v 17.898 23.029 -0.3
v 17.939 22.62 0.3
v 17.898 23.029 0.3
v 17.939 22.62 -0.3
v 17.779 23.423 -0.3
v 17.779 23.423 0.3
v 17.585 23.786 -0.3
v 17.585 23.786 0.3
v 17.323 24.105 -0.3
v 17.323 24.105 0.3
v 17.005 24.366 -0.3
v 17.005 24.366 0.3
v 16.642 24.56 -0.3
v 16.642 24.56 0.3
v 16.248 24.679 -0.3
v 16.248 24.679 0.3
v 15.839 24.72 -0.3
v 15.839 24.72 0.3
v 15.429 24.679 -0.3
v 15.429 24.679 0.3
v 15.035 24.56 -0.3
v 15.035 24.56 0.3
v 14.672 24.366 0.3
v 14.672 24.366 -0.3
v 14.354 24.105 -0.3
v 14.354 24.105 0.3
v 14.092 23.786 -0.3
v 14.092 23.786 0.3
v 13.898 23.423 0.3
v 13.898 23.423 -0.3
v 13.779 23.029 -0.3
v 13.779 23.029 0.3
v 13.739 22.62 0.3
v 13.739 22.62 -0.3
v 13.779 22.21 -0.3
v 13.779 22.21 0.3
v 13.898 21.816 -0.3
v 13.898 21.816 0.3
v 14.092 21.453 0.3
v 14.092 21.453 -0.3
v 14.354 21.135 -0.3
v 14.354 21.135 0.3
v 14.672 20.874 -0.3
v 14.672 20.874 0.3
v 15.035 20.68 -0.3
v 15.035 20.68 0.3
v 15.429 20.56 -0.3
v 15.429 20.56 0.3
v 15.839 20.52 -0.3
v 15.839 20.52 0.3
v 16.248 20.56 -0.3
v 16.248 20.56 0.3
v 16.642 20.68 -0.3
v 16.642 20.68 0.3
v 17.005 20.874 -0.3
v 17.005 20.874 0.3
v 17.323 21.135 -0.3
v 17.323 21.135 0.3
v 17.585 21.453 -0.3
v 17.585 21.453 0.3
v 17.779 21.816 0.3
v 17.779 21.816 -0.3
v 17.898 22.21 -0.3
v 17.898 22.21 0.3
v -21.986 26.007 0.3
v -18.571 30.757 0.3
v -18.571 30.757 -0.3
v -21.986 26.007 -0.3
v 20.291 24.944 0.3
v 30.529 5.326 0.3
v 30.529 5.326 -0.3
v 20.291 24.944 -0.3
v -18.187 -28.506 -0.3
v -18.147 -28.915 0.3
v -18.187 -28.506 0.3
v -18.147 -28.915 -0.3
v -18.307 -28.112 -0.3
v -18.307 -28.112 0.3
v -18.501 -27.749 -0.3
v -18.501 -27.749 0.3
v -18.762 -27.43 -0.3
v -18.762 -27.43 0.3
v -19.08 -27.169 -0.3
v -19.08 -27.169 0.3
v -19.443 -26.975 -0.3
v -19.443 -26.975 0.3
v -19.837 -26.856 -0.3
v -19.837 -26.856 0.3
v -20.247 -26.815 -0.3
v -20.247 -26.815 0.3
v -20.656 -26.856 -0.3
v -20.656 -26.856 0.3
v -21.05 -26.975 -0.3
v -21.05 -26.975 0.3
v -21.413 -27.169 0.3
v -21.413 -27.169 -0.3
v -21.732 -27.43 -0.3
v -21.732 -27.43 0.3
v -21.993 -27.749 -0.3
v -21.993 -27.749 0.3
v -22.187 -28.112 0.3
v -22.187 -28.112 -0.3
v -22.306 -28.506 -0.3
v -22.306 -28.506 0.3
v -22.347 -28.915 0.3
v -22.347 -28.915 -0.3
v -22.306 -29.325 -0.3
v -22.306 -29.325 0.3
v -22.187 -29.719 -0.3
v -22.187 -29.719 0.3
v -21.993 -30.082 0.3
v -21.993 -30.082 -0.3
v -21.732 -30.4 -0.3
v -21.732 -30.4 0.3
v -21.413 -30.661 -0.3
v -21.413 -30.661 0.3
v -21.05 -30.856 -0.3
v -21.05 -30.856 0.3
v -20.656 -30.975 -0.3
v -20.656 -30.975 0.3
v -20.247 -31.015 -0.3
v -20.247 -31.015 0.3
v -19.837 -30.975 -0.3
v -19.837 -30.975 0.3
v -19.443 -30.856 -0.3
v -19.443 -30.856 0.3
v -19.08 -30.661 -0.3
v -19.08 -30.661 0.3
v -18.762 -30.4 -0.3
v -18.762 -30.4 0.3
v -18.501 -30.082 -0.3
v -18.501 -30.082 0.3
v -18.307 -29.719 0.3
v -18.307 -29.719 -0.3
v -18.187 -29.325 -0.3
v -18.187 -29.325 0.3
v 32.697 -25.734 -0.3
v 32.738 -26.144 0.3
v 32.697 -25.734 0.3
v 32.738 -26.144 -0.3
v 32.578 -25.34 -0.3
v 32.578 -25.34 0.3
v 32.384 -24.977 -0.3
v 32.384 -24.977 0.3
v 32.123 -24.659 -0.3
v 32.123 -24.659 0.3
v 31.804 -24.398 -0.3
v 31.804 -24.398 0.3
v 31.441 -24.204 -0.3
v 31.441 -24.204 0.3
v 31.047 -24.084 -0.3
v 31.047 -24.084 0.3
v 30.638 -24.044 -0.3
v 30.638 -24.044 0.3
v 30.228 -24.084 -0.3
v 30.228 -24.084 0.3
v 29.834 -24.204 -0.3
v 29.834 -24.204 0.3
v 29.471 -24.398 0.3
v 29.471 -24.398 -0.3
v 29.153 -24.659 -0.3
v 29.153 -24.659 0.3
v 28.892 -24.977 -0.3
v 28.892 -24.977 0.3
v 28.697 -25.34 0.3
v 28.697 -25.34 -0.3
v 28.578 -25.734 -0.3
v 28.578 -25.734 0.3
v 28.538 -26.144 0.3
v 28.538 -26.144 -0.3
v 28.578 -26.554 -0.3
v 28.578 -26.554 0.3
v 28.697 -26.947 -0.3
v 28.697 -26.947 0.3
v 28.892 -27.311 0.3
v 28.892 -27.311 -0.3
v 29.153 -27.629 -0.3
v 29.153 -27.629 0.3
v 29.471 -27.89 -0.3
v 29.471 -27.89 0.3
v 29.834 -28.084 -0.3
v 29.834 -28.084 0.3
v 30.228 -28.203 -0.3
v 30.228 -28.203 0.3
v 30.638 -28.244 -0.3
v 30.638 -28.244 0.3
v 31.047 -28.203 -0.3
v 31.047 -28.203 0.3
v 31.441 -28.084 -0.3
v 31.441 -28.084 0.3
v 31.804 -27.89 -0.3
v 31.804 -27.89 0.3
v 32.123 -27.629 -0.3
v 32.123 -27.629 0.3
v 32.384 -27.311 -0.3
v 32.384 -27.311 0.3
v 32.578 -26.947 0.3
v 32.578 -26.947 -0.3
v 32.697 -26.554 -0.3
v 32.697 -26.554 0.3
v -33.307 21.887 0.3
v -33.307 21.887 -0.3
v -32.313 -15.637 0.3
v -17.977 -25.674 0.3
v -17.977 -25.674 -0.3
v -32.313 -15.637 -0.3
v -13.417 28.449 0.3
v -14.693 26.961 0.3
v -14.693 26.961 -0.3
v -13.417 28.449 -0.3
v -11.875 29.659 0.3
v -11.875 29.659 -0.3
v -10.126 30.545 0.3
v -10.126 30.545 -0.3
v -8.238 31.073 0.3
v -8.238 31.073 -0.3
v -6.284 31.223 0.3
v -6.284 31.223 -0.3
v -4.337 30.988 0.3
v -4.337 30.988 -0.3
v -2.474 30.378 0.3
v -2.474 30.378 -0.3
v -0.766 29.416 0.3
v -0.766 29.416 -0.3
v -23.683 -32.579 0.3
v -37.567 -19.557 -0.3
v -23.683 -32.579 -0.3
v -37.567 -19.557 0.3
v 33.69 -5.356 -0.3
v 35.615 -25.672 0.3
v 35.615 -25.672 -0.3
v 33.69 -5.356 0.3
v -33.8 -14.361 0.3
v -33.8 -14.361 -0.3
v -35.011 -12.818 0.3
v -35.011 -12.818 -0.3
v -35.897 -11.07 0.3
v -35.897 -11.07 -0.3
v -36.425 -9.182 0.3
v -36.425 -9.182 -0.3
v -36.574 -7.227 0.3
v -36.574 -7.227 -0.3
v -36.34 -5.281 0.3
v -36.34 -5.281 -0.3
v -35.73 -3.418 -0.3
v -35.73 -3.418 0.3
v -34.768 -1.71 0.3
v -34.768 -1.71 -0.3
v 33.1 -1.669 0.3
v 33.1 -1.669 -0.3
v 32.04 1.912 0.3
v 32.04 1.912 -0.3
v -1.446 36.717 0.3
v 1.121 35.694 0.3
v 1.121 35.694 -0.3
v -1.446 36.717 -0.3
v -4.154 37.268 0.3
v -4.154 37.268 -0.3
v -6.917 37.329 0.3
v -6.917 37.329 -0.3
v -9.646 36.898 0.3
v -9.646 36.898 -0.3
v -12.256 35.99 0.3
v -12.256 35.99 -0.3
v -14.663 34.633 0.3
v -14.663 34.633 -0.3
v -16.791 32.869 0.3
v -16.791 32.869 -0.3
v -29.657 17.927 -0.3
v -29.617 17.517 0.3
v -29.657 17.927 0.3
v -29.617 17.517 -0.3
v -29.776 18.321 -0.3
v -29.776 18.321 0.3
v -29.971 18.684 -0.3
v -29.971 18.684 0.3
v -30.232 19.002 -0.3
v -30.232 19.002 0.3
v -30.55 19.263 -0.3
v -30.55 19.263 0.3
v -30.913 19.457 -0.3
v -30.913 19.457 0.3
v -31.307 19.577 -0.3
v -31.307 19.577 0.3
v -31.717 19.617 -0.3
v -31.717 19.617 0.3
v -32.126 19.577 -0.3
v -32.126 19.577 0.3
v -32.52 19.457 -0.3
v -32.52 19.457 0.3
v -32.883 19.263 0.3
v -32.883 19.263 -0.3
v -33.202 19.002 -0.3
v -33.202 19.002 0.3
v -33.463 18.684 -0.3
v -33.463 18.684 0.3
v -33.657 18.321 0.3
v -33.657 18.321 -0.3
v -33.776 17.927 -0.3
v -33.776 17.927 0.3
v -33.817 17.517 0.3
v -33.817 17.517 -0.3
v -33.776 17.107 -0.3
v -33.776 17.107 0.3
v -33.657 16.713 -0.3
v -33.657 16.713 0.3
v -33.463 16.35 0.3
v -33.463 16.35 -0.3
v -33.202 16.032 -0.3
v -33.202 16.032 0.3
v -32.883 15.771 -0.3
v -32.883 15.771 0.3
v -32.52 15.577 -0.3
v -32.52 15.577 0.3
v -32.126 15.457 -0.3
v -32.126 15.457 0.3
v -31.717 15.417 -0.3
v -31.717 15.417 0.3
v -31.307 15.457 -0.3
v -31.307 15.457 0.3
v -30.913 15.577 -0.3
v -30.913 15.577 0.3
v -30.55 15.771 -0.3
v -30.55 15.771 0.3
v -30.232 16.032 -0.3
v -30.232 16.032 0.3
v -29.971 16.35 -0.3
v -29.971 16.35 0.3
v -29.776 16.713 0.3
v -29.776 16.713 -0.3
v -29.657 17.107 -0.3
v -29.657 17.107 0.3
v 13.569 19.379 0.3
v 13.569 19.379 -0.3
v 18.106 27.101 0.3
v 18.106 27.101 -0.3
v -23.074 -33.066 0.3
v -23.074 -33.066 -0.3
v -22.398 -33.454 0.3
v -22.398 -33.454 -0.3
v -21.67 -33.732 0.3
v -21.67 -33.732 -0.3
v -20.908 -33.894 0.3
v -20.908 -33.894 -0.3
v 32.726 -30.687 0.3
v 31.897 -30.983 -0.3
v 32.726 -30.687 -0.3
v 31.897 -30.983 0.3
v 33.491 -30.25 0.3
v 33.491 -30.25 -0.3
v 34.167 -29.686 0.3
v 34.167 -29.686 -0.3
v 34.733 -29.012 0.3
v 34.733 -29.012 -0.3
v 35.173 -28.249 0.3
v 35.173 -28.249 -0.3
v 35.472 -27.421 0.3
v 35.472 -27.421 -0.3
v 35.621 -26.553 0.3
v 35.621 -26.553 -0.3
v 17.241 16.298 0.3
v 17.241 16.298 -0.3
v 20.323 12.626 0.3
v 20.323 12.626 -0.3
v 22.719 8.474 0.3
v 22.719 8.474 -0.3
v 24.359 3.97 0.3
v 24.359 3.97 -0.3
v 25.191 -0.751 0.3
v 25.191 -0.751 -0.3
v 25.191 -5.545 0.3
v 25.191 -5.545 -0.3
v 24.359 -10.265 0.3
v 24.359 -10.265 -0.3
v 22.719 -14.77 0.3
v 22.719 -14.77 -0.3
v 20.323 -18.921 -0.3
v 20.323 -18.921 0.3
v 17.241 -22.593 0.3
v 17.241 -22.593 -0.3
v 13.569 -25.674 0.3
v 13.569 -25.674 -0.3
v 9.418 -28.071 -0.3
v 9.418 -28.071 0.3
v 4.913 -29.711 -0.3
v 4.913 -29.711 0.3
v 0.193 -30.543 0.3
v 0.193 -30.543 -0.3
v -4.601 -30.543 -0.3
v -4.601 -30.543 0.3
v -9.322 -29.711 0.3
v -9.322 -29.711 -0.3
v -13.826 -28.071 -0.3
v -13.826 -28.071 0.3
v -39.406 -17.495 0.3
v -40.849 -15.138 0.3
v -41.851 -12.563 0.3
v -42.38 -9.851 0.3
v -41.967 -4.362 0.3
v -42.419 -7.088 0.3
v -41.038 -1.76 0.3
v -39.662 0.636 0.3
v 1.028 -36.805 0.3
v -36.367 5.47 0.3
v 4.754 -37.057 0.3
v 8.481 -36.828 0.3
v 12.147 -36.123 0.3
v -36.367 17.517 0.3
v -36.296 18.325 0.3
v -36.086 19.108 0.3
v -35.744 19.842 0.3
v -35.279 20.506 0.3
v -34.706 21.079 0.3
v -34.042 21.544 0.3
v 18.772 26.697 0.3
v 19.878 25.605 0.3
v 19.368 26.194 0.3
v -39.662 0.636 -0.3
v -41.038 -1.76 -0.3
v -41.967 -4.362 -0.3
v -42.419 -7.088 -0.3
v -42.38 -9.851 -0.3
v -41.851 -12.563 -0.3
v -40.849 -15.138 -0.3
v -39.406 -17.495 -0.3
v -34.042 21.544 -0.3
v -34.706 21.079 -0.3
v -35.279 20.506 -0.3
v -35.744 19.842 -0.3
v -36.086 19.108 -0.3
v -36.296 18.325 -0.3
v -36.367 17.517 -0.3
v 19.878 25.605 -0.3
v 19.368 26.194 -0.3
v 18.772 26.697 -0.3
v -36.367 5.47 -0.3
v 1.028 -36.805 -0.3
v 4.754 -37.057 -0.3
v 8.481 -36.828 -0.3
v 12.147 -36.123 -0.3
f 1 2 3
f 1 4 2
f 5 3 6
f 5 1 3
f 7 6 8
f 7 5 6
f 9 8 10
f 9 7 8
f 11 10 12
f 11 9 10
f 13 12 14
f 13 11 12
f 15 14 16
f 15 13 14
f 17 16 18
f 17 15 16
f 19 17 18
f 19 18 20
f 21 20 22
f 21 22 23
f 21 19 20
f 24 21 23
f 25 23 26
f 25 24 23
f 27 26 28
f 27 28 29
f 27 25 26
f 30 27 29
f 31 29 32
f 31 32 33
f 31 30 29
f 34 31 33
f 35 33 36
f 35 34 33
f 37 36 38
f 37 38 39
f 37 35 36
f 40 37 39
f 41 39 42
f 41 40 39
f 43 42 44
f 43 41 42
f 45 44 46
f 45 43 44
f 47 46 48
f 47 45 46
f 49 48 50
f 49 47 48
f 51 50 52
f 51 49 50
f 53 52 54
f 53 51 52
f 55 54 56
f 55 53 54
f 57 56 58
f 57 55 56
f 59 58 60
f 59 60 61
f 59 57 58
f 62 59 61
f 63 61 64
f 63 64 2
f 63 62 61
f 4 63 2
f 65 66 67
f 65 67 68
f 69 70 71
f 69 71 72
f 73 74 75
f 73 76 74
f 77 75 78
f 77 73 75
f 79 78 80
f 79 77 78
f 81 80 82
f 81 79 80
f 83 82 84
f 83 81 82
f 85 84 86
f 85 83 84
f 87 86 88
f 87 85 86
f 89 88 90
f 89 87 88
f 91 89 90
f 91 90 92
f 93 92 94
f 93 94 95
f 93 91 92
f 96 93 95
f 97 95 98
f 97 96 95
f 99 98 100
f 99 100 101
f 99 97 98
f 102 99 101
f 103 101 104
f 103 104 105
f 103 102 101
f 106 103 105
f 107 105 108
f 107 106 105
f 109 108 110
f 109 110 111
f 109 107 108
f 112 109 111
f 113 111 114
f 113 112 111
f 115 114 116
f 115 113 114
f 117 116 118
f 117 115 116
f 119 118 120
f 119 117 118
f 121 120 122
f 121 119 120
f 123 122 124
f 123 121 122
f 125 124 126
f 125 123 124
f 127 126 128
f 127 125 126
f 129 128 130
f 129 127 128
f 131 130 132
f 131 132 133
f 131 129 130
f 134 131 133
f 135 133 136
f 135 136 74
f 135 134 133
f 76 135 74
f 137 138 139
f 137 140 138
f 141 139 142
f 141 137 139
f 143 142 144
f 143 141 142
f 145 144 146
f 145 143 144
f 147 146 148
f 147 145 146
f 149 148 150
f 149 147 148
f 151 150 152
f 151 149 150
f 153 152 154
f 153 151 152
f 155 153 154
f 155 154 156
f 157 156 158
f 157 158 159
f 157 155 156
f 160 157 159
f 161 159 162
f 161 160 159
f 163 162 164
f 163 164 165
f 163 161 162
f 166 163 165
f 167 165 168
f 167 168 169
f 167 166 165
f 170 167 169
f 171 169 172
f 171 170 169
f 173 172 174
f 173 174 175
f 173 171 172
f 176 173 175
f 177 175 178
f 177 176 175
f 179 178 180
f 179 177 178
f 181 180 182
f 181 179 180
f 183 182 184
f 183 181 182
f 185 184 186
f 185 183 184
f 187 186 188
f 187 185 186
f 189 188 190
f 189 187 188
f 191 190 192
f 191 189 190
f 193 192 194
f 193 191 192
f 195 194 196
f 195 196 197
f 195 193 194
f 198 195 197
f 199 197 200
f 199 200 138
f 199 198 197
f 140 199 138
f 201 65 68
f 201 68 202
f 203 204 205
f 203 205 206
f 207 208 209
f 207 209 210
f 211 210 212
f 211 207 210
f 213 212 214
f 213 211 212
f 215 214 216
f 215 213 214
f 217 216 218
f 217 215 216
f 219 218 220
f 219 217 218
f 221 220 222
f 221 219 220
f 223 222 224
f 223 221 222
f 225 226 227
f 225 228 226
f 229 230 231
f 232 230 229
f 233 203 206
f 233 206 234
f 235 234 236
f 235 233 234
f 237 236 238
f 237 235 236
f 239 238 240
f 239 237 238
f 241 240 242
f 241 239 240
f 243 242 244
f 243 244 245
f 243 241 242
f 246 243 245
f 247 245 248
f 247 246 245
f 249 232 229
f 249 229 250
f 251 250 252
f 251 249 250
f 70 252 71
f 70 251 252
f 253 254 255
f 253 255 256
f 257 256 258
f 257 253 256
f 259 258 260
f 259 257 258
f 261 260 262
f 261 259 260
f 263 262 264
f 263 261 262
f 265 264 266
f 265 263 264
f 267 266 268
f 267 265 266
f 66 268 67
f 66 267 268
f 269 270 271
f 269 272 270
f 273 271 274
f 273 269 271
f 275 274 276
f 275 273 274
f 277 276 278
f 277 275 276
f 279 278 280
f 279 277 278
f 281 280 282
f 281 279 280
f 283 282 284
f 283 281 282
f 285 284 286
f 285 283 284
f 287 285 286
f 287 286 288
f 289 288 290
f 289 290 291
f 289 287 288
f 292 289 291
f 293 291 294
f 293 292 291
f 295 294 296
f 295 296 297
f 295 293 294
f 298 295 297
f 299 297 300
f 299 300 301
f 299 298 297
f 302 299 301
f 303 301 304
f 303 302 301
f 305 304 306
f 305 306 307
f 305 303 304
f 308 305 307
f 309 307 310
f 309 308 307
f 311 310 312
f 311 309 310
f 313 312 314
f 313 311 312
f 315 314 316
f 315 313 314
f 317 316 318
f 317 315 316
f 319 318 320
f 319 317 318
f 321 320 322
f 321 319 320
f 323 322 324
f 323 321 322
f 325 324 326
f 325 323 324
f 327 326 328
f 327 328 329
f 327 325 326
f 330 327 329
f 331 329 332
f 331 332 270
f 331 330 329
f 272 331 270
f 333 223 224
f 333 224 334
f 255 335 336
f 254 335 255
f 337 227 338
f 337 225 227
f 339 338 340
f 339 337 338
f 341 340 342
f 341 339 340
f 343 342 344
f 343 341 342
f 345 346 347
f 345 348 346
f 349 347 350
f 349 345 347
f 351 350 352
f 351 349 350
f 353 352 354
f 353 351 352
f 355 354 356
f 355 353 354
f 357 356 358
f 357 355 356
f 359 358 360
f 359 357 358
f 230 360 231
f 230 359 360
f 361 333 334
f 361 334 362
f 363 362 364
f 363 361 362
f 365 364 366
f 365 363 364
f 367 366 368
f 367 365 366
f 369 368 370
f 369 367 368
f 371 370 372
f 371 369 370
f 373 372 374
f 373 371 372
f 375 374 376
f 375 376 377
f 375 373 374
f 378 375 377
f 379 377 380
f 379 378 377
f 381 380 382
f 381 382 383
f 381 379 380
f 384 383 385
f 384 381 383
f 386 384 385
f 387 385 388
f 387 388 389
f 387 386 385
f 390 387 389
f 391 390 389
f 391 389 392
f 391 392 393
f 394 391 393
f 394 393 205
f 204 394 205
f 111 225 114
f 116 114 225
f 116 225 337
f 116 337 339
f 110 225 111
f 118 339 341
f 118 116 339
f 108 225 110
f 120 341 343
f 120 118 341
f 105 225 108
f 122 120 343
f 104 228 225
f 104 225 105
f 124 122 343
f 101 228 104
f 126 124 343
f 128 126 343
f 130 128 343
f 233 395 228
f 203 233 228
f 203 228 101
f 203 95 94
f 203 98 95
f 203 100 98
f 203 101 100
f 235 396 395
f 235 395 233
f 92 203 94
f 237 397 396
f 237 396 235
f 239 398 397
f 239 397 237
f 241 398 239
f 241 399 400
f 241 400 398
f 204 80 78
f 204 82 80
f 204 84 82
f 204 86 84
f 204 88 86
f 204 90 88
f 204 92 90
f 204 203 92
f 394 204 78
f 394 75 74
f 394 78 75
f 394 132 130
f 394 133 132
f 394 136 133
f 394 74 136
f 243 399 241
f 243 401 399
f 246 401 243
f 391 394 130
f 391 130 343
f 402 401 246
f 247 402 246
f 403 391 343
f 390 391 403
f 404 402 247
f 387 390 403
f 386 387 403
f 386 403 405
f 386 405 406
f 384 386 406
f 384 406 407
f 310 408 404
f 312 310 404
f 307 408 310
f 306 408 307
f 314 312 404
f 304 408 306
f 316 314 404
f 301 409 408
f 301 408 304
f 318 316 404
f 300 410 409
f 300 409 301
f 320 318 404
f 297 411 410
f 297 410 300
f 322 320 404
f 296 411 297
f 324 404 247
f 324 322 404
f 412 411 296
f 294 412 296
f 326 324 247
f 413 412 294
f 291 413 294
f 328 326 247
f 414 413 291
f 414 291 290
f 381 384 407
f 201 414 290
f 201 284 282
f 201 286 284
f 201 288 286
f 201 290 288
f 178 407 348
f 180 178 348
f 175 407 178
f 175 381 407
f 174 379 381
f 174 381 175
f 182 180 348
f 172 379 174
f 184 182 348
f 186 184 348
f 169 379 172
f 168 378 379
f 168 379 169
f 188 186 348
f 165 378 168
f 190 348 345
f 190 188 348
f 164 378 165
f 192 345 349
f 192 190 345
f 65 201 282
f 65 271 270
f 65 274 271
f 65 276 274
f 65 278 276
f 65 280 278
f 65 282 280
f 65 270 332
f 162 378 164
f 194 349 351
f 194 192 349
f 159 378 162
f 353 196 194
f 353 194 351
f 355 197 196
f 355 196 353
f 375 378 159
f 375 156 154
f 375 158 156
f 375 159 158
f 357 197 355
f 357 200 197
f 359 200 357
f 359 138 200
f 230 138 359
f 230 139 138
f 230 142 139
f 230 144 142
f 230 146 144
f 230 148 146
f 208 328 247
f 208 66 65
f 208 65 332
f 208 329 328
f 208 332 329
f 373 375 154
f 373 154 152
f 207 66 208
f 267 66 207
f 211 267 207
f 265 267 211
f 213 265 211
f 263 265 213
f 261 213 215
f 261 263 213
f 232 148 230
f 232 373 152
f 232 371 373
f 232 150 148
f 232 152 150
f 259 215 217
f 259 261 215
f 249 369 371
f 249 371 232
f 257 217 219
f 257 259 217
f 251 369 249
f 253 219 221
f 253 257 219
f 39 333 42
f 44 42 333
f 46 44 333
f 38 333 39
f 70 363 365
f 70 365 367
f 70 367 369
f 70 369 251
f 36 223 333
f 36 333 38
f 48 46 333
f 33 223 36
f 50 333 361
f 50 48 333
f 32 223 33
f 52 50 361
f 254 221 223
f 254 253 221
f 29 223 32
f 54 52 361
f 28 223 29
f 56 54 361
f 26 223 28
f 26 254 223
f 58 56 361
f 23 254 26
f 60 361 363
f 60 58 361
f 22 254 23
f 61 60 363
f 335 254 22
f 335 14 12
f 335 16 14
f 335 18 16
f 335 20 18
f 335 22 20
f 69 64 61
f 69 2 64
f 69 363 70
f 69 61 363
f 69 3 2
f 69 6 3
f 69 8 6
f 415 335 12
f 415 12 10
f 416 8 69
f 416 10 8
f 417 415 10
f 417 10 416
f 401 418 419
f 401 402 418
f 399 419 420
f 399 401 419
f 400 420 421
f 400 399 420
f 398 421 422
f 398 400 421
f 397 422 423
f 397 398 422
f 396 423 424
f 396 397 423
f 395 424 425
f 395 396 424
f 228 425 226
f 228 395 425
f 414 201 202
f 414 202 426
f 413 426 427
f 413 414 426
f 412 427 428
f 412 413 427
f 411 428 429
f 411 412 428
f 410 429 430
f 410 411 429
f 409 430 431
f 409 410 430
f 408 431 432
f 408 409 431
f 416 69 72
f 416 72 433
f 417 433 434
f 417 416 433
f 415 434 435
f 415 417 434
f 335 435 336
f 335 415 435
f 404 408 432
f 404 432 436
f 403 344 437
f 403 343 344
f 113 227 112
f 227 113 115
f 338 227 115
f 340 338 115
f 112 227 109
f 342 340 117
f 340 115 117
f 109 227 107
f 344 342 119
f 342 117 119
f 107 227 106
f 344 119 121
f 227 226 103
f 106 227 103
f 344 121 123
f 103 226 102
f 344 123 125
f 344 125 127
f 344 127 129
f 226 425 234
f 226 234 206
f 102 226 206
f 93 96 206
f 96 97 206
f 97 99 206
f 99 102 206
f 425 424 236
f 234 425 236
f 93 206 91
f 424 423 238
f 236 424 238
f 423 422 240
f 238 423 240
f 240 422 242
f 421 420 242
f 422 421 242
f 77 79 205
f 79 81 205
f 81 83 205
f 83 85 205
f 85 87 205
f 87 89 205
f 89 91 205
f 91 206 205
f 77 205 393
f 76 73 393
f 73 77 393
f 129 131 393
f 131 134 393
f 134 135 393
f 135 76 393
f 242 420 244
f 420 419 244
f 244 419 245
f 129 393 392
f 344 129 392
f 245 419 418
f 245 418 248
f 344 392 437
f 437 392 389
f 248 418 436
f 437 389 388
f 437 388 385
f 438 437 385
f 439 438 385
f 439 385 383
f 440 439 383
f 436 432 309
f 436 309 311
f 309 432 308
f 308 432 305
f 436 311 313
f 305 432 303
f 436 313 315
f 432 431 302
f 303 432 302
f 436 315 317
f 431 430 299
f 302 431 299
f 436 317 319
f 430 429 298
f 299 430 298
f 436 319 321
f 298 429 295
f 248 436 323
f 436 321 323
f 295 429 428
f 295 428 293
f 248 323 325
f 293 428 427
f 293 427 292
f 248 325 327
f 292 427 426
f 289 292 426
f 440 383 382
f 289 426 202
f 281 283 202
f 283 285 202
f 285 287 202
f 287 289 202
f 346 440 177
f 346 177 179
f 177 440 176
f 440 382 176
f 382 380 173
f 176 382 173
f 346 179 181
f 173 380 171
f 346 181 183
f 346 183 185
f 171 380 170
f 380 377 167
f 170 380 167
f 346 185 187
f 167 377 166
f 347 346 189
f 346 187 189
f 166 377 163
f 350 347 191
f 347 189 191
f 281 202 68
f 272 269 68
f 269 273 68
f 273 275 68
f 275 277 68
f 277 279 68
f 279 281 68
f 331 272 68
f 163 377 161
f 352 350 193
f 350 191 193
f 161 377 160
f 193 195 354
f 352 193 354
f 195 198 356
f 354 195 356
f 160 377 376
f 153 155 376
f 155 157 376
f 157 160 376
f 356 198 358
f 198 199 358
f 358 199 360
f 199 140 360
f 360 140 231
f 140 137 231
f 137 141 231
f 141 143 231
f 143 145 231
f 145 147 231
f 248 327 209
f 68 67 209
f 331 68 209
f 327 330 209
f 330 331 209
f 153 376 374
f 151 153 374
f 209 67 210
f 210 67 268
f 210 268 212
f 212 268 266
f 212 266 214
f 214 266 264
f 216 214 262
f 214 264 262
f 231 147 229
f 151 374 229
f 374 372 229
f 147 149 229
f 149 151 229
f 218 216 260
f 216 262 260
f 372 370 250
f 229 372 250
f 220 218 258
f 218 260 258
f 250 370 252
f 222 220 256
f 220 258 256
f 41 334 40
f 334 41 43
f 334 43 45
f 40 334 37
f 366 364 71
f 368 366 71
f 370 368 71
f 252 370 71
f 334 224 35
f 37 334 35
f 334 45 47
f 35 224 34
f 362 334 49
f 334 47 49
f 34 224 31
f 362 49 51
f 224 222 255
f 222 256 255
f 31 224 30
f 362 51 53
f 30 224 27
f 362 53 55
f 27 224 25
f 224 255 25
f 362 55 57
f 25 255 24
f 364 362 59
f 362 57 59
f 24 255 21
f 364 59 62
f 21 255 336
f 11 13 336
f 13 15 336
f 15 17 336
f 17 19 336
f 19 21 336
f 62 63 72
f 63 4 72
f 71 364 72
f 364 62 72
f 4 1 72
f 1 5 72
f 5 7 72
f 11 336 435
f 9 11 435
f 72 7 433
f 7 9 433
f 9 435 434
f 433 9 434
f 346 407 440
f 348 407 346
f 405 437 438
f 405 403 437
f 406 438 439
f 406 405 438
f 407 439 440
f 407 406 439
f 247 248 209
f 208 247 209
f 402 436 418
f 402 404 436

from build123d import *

# Parameters (mm, degrees)
ESQUISSE1_R          = 2.1
BASE_EXTRUSION_DEPTH = 0.3


with BuildPart() as part:
    # Esquisse1 → Base-Extrusion (new, symmetric)
    with BuildSketch(Plane.XY):
        with BuildLine():
            Line((35.615327088, -25.672223926), (33.690495331, -5.355736059))
            ThreePointArc((33.690495331, -5.355736059), (32.627582421, 0.138570374), (30.529161577, 5.326423206))
            Line((30.529161577, 5.326423206), (20.291189648, 24.943575231))
            ThreePointArc((20.291189648, 24.943575231), (19.367522251, 26.19363098), (18.105897834, 27.101433088))
            Line((18.105897834, 27.101433088), (1.120998661, 35.694422442))
            ThreePointArc((1.120998661, 35.694422442), (-9.646140892, 36.898255889), (-18.57139047, 30.756559943))
            Line((-18.57139047, 30.756559943), (-21.986449586, 26.007166333))
            Line((-21.986449586, 26.007166333), (-33.307069298, 21.886797725))
            ThreePointArc((-33.307069298, 21.886797725), (-35.52580407, 20.184302655), (-36.366774139, 17.517086354))
            Line((-36.366774139, 17.517086354), (-36.366774139, 5.469934486))
            Line((-36.366774139, 5.469934486), (-39.661725259, 0.636440352))
            ThreePointArc((-39.661725259, 0.636440352), (-42.380416479, -9.851134542), (-37.566604459, -19.557200839))
            Line((-37.566604459, -19.557200839), (-23.682658123, -32.578809807))
            ThreePointArc((-23.682658123, -32.578809807), (-22.398102217, -33.453862354), (-20.907521199, -33.894281545))
            Line((-20.907521199, -33.894281545), (1.028164427, -36.805367071))
            ThreePointArc((1.028164427, -36.805367071), (6.620853648, -37.002887485), (12.147350486, -36.122535429))
            Line((12.147350486, -36.122535429), (31.896935448, -30.982637535))
            ThreePointArc((31.896935448, -30.982637535), (34.733377642, -29.011706008), (35.615327088, -25.672223926))
        make_face()
        with Locations((15.838548739, 22.619791811)):
            Circle(ESQUISSE1_R, mode=Mode.SUBTRACT)
        with Locations((-31.716624427, 17.517086354)):
            Circle(ESQUISSE1_R, mode=Mode.SUBTRACT)
        with Locations((-20.246771948, -28.915387001)):
            Circle(ESQUISSE1_R, mode=Mode.SUBTRACT)
        with Locations((30.63761742, -26.143823826)):
            Circle(ESQUISSE1_R, mode=Mode.SUBTRACT)
        with BuildLine():
            Line((-34.768380459, -1.709606371), (-14.693205187, 26.96071518))
            ThreePointArc((-14.693205187, 26.96071518), (-8.23816652, 31.073028346), (-0.76592038, 29.416471259))
            Line((-0.76592038, 29.416471259), (13.569240395, 19.378883623))
            ThreePointArc((13.569240395, 19.378883623), (20.322569613, -18.921149595), (-17.977463605, -25.674478813))
            Line((-17.977463605, -25.674478813), (-32.31262438, -15.636891177))
            ThreePointArc((-32.31262438, -15.636891177), (-36.424937546, -9.181852511), (-34.768380459, -1.709606371))
        make_face(mode=Mode.SUBTRACT)
    extrude(amount=BASE_EXTRUSION_DEPTH, both=True)


solid = part.part
